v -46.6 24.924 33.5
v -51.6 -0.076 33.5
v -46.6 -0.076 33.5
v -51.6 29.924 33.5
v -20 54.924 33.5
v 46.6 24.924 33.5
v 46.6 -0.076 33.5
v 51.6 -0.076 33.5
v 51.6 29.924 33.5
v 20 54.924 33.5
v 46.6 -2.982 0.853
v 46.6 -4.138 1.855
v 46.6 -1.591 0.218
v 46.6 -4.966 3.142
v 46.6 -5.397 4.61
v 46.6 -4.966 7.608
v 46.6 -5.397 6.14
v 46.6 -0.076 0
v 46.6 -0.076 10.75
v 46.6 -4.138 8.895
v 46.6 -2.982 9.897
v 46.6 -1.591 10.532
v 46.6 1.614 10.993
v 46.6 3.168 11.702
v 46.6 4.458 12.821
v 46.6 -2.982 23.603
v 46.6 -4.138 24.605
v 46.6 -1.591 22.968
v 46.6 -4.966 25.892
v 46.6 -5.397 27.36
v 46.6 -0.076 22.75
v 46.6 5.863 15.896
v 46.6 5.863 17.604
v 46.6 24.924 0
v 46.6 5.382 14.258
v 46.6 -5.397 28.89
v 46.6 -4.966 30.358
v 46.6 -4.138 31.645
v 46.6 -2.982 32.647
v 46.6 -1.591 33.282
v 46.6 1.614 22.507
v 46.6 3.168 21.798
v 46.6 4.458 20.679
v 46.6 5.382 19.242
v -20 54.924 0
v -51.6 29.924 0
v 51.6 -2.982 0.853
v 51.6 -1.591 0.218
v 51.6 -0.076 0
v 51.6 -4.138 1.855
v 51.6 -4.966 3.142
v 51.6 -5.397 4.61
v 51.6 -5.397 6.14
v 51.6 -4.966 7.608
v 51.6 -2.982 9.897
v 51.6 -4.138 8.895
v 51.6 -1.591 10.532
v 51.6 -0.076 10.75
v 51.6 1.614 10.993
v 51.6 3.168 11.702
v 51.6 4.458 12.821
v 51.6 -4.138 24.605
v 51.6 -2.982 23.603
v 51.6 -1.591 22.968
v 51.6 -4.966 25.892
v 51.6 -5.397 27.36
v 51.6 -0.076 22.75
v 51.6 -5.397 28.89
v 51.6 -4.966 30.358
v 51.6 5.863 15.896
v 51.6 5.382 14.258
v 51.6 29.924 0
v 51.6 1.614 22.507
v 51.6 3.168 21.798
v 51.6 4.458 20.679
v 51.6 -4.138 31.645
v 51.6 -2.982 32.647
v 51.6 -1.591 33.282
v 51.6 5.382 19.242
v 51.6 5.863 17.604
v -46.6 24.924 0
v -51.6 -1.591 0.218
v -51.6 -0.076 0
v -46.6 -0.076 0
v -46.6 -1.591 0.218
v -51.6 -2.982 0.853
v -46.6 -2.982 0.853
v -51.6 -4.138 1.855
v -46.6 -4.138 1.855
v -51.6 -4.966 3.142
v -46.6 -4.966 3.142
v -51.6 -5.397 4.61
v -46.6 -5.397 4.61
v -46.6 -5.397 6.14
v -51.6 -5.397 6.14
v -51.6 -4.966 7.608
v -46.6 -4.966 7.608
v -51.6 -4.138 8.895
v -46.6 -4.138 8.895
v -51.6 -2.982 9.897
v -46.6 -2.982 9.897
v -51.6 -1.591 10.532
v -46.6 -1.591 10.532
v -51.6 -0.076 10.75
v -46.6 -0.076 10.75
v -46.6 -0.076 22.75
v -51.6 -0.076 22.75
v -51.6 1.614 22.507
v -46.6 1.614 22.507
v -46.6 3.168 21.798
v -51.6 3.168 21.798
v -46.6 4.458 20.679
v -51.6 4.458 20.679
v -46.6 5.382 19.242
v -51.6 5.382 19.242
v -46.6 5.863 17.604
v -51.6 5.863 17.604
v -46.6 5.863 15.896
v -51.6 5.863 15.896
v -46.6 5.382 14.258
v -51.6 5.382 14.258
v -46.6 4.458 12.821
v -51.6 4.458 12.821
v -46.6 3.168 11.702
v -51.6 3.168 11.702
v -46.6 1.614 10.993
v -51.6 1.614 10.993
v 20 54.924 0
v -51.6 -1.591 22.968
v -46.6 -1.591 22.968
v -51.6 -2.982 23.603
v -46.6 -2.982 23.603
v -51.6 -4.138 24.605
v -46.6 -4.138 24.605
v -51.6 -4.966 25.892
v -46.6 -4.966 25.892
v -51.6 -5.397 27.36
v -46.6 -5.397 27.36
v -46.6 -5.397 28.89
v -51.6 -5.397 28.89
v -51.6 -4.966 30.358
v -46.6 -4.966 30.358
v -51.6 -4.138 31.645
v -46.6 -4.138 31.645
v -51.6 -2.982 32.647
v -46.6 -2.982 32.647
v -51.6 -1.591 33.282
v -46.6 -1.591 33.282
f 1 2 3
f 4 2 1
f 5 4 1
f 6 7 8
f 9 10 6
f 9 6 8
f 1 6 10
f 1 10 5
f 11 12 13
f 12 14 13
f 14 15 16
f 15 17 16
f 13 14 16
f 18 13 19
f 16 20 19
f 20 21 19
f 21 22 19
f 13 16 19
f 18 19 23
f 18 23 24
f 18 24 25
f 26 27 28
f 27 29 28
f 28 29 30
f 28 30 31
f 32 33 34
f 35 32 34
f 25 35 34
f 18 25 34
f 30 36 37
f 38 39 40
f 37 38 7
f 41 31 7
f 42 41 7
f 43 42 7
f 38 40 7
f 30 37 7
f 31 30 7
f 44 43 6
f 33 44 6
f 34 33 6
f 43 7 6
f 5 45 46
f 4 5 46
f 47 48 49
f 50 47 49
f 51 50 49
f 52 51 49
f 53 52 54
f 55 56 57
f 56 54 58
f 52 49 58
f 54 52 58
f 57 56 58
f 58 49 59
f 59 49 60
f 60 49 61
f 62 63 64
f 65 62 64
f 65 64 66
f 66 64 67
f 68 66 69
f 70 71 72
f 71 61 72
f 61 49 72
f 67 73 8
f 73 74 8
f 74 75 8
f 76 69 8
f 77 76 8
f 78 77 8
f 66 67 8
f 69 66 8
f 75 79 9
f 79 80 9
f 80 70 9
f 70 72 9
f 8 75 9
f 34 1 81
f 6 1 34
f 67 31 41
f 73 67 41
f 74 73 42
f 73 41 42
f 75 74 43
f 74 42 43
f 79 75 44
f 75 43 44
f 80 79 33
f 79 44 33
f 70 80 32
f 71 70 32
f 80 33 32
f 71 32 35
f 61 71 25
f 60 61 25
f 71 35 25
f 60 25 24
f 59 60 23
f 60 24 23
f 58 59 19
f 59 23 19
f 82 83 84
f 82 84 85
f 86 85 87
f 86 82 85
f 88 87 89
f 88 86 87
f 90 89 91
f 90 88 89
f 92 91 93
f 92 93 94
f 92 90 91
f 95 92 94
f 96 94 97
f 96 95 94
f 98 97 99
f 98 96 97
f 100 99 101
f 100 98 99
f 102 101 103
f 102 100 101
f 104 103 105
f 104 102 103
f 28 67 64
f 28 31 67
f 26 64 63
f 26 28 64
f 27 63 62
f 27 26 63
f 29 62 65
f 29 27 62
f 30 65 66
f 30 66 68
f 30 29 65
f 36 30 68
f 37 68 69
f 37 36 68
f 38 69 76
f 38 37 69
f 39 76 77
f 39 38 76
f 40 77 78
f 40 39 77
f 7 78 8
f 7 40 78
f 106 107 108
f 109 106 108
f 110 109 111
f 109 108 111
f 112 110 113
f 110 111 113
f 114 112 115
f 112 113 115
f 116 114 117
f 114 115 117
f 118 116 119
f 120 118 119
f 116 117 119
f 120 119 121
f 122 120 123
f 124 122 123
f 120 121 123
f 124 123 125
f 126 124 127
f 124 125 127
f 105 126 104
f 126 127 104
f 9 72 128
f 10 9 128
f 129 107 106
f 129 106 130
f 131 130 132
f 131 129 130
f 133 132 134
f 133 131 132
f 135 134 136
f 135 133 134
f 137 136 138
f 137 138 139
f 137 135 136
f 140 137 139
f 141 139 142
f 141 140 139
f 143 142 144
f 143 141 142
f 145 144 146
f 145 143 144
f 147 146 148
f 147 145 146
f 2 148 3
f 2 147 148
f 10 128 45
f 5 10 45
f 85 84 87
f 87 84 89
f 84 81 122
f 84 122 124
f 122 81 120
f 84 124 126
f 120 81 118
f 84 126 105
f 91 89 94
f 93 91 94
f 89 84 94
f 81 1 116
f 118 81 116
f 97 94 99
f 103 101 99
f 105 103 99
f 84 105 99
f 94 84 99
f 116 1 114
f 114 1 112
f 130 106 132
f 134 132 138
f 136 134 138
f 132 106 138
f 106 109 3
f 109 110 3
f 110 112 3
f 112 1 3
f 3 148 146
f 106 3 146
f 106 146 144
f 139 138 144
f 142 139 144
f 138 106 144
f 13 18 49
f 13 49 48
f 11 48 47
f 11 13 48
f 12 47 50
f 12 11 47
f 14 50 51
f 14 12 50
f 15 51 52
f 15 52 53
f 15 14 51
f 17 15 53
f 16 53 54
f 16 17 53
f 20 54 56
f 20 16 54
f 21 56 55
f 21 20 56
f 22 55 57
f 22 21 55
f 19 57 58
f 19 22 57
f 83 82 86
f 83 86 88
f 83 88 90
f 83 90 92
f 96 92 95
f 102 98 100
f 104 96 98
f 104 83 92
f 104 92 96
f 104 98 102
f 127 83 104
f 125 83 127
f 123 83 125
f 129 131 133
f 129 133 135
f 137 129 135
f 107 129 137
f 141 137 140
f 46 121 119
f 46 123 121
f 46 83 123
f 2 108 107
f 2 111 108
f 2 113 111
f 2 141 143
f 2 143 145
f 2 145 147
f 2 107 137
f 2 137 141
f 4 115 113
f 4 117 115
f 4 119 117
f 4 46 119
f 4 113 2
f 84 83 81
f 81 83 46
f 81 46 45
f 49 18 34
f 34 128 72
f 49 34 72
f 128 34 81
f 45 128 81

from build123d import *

# Parameters (mm, degrees)
EXTRUDE_1_DEPTH     = 33.5
SKETCH_6_R          = 6
CUT_EXTRUDE_2_DEPTH = 103.2
SKETCH_7_R          = 5.375
EXTRUDE_3_DEPTH     = 103.2
CUT_EXTRUDE_3_REACH = 84.471


with BuildPart() as part:
    # 草图1 → 凸台-拉伸1 (new body)
    with BuildSketch(Plane.XY):
        Polygon((51.6, -0.076277531), (51.6, 29.923722469), (20, 54.923722469), (-20, 54.923722469), (-51.6, 29.923722469), (-51.6, -0.076277531), align=None)
    extrude(amount=EXTRUDE_1_DEPTH)

    # 草图6 → 切除-拉伸2 (cut)
    with BuildSketch(Plane.ZY.offset(51.6)):
        with Locations((16.75, -0.076277531)):
            Circle(SKETCH_6_R)
    extrude(amount=-CUT_EXTRUDE_2_DEPTH, mode=Mode.SUBTRACT)

    # 草图7 → 凸台-拉伸3 (add)
    with BuildSketch(Plane.ZY.offset(51.6)):
        with Locations((5.375, -0.076277531)):
            Circle(SKETCH_7_R)
        with Locations((28.125, -0.076277531)):
            Circle(SKETCH_7_R)
    extrude(amount=-EXTRUDE_3_DEPTH)

    # 切除-拉伸3: up to this face of the body (flat: up to its plane)
    cut_extrude_3_end = Plane(part.part.faces().sort_by_distance((0, 24.324732157, 0))[0])
    # 草图8 → 切除-拉伸3 (cut, up to the picked face)
    with BuildSketch(Plane.XY.offset(33.5), mode=Mode.PRIVATE) as cut_extrude_3_sk1:
        Polygon((-46.6, -0.076277531), (-46.6, 24.923722469), (46.6, 24.923722469), (46.6, -0.076277531), (46.6, -12.111349377), (-46.6, -12.111349377), align=None)
    cut_extrude_3_tool1 = split(extrude(cut_extrude_3_sk1.sketch, amount=-CUT_EXTRUDE_3_REACH, mode=Mode.PRIVATE), bisect_by=cut_extrude_3_end, keep=Keep.BOTH, mode=Mode.PRIVATE)
    add(cut_extrude_3_tool1.solids().sort_by(Axis((0, 6.406187, 33.5), (0, 0, -1)))[0], mode=Mode.SUBTRACT)


solid = part.part
